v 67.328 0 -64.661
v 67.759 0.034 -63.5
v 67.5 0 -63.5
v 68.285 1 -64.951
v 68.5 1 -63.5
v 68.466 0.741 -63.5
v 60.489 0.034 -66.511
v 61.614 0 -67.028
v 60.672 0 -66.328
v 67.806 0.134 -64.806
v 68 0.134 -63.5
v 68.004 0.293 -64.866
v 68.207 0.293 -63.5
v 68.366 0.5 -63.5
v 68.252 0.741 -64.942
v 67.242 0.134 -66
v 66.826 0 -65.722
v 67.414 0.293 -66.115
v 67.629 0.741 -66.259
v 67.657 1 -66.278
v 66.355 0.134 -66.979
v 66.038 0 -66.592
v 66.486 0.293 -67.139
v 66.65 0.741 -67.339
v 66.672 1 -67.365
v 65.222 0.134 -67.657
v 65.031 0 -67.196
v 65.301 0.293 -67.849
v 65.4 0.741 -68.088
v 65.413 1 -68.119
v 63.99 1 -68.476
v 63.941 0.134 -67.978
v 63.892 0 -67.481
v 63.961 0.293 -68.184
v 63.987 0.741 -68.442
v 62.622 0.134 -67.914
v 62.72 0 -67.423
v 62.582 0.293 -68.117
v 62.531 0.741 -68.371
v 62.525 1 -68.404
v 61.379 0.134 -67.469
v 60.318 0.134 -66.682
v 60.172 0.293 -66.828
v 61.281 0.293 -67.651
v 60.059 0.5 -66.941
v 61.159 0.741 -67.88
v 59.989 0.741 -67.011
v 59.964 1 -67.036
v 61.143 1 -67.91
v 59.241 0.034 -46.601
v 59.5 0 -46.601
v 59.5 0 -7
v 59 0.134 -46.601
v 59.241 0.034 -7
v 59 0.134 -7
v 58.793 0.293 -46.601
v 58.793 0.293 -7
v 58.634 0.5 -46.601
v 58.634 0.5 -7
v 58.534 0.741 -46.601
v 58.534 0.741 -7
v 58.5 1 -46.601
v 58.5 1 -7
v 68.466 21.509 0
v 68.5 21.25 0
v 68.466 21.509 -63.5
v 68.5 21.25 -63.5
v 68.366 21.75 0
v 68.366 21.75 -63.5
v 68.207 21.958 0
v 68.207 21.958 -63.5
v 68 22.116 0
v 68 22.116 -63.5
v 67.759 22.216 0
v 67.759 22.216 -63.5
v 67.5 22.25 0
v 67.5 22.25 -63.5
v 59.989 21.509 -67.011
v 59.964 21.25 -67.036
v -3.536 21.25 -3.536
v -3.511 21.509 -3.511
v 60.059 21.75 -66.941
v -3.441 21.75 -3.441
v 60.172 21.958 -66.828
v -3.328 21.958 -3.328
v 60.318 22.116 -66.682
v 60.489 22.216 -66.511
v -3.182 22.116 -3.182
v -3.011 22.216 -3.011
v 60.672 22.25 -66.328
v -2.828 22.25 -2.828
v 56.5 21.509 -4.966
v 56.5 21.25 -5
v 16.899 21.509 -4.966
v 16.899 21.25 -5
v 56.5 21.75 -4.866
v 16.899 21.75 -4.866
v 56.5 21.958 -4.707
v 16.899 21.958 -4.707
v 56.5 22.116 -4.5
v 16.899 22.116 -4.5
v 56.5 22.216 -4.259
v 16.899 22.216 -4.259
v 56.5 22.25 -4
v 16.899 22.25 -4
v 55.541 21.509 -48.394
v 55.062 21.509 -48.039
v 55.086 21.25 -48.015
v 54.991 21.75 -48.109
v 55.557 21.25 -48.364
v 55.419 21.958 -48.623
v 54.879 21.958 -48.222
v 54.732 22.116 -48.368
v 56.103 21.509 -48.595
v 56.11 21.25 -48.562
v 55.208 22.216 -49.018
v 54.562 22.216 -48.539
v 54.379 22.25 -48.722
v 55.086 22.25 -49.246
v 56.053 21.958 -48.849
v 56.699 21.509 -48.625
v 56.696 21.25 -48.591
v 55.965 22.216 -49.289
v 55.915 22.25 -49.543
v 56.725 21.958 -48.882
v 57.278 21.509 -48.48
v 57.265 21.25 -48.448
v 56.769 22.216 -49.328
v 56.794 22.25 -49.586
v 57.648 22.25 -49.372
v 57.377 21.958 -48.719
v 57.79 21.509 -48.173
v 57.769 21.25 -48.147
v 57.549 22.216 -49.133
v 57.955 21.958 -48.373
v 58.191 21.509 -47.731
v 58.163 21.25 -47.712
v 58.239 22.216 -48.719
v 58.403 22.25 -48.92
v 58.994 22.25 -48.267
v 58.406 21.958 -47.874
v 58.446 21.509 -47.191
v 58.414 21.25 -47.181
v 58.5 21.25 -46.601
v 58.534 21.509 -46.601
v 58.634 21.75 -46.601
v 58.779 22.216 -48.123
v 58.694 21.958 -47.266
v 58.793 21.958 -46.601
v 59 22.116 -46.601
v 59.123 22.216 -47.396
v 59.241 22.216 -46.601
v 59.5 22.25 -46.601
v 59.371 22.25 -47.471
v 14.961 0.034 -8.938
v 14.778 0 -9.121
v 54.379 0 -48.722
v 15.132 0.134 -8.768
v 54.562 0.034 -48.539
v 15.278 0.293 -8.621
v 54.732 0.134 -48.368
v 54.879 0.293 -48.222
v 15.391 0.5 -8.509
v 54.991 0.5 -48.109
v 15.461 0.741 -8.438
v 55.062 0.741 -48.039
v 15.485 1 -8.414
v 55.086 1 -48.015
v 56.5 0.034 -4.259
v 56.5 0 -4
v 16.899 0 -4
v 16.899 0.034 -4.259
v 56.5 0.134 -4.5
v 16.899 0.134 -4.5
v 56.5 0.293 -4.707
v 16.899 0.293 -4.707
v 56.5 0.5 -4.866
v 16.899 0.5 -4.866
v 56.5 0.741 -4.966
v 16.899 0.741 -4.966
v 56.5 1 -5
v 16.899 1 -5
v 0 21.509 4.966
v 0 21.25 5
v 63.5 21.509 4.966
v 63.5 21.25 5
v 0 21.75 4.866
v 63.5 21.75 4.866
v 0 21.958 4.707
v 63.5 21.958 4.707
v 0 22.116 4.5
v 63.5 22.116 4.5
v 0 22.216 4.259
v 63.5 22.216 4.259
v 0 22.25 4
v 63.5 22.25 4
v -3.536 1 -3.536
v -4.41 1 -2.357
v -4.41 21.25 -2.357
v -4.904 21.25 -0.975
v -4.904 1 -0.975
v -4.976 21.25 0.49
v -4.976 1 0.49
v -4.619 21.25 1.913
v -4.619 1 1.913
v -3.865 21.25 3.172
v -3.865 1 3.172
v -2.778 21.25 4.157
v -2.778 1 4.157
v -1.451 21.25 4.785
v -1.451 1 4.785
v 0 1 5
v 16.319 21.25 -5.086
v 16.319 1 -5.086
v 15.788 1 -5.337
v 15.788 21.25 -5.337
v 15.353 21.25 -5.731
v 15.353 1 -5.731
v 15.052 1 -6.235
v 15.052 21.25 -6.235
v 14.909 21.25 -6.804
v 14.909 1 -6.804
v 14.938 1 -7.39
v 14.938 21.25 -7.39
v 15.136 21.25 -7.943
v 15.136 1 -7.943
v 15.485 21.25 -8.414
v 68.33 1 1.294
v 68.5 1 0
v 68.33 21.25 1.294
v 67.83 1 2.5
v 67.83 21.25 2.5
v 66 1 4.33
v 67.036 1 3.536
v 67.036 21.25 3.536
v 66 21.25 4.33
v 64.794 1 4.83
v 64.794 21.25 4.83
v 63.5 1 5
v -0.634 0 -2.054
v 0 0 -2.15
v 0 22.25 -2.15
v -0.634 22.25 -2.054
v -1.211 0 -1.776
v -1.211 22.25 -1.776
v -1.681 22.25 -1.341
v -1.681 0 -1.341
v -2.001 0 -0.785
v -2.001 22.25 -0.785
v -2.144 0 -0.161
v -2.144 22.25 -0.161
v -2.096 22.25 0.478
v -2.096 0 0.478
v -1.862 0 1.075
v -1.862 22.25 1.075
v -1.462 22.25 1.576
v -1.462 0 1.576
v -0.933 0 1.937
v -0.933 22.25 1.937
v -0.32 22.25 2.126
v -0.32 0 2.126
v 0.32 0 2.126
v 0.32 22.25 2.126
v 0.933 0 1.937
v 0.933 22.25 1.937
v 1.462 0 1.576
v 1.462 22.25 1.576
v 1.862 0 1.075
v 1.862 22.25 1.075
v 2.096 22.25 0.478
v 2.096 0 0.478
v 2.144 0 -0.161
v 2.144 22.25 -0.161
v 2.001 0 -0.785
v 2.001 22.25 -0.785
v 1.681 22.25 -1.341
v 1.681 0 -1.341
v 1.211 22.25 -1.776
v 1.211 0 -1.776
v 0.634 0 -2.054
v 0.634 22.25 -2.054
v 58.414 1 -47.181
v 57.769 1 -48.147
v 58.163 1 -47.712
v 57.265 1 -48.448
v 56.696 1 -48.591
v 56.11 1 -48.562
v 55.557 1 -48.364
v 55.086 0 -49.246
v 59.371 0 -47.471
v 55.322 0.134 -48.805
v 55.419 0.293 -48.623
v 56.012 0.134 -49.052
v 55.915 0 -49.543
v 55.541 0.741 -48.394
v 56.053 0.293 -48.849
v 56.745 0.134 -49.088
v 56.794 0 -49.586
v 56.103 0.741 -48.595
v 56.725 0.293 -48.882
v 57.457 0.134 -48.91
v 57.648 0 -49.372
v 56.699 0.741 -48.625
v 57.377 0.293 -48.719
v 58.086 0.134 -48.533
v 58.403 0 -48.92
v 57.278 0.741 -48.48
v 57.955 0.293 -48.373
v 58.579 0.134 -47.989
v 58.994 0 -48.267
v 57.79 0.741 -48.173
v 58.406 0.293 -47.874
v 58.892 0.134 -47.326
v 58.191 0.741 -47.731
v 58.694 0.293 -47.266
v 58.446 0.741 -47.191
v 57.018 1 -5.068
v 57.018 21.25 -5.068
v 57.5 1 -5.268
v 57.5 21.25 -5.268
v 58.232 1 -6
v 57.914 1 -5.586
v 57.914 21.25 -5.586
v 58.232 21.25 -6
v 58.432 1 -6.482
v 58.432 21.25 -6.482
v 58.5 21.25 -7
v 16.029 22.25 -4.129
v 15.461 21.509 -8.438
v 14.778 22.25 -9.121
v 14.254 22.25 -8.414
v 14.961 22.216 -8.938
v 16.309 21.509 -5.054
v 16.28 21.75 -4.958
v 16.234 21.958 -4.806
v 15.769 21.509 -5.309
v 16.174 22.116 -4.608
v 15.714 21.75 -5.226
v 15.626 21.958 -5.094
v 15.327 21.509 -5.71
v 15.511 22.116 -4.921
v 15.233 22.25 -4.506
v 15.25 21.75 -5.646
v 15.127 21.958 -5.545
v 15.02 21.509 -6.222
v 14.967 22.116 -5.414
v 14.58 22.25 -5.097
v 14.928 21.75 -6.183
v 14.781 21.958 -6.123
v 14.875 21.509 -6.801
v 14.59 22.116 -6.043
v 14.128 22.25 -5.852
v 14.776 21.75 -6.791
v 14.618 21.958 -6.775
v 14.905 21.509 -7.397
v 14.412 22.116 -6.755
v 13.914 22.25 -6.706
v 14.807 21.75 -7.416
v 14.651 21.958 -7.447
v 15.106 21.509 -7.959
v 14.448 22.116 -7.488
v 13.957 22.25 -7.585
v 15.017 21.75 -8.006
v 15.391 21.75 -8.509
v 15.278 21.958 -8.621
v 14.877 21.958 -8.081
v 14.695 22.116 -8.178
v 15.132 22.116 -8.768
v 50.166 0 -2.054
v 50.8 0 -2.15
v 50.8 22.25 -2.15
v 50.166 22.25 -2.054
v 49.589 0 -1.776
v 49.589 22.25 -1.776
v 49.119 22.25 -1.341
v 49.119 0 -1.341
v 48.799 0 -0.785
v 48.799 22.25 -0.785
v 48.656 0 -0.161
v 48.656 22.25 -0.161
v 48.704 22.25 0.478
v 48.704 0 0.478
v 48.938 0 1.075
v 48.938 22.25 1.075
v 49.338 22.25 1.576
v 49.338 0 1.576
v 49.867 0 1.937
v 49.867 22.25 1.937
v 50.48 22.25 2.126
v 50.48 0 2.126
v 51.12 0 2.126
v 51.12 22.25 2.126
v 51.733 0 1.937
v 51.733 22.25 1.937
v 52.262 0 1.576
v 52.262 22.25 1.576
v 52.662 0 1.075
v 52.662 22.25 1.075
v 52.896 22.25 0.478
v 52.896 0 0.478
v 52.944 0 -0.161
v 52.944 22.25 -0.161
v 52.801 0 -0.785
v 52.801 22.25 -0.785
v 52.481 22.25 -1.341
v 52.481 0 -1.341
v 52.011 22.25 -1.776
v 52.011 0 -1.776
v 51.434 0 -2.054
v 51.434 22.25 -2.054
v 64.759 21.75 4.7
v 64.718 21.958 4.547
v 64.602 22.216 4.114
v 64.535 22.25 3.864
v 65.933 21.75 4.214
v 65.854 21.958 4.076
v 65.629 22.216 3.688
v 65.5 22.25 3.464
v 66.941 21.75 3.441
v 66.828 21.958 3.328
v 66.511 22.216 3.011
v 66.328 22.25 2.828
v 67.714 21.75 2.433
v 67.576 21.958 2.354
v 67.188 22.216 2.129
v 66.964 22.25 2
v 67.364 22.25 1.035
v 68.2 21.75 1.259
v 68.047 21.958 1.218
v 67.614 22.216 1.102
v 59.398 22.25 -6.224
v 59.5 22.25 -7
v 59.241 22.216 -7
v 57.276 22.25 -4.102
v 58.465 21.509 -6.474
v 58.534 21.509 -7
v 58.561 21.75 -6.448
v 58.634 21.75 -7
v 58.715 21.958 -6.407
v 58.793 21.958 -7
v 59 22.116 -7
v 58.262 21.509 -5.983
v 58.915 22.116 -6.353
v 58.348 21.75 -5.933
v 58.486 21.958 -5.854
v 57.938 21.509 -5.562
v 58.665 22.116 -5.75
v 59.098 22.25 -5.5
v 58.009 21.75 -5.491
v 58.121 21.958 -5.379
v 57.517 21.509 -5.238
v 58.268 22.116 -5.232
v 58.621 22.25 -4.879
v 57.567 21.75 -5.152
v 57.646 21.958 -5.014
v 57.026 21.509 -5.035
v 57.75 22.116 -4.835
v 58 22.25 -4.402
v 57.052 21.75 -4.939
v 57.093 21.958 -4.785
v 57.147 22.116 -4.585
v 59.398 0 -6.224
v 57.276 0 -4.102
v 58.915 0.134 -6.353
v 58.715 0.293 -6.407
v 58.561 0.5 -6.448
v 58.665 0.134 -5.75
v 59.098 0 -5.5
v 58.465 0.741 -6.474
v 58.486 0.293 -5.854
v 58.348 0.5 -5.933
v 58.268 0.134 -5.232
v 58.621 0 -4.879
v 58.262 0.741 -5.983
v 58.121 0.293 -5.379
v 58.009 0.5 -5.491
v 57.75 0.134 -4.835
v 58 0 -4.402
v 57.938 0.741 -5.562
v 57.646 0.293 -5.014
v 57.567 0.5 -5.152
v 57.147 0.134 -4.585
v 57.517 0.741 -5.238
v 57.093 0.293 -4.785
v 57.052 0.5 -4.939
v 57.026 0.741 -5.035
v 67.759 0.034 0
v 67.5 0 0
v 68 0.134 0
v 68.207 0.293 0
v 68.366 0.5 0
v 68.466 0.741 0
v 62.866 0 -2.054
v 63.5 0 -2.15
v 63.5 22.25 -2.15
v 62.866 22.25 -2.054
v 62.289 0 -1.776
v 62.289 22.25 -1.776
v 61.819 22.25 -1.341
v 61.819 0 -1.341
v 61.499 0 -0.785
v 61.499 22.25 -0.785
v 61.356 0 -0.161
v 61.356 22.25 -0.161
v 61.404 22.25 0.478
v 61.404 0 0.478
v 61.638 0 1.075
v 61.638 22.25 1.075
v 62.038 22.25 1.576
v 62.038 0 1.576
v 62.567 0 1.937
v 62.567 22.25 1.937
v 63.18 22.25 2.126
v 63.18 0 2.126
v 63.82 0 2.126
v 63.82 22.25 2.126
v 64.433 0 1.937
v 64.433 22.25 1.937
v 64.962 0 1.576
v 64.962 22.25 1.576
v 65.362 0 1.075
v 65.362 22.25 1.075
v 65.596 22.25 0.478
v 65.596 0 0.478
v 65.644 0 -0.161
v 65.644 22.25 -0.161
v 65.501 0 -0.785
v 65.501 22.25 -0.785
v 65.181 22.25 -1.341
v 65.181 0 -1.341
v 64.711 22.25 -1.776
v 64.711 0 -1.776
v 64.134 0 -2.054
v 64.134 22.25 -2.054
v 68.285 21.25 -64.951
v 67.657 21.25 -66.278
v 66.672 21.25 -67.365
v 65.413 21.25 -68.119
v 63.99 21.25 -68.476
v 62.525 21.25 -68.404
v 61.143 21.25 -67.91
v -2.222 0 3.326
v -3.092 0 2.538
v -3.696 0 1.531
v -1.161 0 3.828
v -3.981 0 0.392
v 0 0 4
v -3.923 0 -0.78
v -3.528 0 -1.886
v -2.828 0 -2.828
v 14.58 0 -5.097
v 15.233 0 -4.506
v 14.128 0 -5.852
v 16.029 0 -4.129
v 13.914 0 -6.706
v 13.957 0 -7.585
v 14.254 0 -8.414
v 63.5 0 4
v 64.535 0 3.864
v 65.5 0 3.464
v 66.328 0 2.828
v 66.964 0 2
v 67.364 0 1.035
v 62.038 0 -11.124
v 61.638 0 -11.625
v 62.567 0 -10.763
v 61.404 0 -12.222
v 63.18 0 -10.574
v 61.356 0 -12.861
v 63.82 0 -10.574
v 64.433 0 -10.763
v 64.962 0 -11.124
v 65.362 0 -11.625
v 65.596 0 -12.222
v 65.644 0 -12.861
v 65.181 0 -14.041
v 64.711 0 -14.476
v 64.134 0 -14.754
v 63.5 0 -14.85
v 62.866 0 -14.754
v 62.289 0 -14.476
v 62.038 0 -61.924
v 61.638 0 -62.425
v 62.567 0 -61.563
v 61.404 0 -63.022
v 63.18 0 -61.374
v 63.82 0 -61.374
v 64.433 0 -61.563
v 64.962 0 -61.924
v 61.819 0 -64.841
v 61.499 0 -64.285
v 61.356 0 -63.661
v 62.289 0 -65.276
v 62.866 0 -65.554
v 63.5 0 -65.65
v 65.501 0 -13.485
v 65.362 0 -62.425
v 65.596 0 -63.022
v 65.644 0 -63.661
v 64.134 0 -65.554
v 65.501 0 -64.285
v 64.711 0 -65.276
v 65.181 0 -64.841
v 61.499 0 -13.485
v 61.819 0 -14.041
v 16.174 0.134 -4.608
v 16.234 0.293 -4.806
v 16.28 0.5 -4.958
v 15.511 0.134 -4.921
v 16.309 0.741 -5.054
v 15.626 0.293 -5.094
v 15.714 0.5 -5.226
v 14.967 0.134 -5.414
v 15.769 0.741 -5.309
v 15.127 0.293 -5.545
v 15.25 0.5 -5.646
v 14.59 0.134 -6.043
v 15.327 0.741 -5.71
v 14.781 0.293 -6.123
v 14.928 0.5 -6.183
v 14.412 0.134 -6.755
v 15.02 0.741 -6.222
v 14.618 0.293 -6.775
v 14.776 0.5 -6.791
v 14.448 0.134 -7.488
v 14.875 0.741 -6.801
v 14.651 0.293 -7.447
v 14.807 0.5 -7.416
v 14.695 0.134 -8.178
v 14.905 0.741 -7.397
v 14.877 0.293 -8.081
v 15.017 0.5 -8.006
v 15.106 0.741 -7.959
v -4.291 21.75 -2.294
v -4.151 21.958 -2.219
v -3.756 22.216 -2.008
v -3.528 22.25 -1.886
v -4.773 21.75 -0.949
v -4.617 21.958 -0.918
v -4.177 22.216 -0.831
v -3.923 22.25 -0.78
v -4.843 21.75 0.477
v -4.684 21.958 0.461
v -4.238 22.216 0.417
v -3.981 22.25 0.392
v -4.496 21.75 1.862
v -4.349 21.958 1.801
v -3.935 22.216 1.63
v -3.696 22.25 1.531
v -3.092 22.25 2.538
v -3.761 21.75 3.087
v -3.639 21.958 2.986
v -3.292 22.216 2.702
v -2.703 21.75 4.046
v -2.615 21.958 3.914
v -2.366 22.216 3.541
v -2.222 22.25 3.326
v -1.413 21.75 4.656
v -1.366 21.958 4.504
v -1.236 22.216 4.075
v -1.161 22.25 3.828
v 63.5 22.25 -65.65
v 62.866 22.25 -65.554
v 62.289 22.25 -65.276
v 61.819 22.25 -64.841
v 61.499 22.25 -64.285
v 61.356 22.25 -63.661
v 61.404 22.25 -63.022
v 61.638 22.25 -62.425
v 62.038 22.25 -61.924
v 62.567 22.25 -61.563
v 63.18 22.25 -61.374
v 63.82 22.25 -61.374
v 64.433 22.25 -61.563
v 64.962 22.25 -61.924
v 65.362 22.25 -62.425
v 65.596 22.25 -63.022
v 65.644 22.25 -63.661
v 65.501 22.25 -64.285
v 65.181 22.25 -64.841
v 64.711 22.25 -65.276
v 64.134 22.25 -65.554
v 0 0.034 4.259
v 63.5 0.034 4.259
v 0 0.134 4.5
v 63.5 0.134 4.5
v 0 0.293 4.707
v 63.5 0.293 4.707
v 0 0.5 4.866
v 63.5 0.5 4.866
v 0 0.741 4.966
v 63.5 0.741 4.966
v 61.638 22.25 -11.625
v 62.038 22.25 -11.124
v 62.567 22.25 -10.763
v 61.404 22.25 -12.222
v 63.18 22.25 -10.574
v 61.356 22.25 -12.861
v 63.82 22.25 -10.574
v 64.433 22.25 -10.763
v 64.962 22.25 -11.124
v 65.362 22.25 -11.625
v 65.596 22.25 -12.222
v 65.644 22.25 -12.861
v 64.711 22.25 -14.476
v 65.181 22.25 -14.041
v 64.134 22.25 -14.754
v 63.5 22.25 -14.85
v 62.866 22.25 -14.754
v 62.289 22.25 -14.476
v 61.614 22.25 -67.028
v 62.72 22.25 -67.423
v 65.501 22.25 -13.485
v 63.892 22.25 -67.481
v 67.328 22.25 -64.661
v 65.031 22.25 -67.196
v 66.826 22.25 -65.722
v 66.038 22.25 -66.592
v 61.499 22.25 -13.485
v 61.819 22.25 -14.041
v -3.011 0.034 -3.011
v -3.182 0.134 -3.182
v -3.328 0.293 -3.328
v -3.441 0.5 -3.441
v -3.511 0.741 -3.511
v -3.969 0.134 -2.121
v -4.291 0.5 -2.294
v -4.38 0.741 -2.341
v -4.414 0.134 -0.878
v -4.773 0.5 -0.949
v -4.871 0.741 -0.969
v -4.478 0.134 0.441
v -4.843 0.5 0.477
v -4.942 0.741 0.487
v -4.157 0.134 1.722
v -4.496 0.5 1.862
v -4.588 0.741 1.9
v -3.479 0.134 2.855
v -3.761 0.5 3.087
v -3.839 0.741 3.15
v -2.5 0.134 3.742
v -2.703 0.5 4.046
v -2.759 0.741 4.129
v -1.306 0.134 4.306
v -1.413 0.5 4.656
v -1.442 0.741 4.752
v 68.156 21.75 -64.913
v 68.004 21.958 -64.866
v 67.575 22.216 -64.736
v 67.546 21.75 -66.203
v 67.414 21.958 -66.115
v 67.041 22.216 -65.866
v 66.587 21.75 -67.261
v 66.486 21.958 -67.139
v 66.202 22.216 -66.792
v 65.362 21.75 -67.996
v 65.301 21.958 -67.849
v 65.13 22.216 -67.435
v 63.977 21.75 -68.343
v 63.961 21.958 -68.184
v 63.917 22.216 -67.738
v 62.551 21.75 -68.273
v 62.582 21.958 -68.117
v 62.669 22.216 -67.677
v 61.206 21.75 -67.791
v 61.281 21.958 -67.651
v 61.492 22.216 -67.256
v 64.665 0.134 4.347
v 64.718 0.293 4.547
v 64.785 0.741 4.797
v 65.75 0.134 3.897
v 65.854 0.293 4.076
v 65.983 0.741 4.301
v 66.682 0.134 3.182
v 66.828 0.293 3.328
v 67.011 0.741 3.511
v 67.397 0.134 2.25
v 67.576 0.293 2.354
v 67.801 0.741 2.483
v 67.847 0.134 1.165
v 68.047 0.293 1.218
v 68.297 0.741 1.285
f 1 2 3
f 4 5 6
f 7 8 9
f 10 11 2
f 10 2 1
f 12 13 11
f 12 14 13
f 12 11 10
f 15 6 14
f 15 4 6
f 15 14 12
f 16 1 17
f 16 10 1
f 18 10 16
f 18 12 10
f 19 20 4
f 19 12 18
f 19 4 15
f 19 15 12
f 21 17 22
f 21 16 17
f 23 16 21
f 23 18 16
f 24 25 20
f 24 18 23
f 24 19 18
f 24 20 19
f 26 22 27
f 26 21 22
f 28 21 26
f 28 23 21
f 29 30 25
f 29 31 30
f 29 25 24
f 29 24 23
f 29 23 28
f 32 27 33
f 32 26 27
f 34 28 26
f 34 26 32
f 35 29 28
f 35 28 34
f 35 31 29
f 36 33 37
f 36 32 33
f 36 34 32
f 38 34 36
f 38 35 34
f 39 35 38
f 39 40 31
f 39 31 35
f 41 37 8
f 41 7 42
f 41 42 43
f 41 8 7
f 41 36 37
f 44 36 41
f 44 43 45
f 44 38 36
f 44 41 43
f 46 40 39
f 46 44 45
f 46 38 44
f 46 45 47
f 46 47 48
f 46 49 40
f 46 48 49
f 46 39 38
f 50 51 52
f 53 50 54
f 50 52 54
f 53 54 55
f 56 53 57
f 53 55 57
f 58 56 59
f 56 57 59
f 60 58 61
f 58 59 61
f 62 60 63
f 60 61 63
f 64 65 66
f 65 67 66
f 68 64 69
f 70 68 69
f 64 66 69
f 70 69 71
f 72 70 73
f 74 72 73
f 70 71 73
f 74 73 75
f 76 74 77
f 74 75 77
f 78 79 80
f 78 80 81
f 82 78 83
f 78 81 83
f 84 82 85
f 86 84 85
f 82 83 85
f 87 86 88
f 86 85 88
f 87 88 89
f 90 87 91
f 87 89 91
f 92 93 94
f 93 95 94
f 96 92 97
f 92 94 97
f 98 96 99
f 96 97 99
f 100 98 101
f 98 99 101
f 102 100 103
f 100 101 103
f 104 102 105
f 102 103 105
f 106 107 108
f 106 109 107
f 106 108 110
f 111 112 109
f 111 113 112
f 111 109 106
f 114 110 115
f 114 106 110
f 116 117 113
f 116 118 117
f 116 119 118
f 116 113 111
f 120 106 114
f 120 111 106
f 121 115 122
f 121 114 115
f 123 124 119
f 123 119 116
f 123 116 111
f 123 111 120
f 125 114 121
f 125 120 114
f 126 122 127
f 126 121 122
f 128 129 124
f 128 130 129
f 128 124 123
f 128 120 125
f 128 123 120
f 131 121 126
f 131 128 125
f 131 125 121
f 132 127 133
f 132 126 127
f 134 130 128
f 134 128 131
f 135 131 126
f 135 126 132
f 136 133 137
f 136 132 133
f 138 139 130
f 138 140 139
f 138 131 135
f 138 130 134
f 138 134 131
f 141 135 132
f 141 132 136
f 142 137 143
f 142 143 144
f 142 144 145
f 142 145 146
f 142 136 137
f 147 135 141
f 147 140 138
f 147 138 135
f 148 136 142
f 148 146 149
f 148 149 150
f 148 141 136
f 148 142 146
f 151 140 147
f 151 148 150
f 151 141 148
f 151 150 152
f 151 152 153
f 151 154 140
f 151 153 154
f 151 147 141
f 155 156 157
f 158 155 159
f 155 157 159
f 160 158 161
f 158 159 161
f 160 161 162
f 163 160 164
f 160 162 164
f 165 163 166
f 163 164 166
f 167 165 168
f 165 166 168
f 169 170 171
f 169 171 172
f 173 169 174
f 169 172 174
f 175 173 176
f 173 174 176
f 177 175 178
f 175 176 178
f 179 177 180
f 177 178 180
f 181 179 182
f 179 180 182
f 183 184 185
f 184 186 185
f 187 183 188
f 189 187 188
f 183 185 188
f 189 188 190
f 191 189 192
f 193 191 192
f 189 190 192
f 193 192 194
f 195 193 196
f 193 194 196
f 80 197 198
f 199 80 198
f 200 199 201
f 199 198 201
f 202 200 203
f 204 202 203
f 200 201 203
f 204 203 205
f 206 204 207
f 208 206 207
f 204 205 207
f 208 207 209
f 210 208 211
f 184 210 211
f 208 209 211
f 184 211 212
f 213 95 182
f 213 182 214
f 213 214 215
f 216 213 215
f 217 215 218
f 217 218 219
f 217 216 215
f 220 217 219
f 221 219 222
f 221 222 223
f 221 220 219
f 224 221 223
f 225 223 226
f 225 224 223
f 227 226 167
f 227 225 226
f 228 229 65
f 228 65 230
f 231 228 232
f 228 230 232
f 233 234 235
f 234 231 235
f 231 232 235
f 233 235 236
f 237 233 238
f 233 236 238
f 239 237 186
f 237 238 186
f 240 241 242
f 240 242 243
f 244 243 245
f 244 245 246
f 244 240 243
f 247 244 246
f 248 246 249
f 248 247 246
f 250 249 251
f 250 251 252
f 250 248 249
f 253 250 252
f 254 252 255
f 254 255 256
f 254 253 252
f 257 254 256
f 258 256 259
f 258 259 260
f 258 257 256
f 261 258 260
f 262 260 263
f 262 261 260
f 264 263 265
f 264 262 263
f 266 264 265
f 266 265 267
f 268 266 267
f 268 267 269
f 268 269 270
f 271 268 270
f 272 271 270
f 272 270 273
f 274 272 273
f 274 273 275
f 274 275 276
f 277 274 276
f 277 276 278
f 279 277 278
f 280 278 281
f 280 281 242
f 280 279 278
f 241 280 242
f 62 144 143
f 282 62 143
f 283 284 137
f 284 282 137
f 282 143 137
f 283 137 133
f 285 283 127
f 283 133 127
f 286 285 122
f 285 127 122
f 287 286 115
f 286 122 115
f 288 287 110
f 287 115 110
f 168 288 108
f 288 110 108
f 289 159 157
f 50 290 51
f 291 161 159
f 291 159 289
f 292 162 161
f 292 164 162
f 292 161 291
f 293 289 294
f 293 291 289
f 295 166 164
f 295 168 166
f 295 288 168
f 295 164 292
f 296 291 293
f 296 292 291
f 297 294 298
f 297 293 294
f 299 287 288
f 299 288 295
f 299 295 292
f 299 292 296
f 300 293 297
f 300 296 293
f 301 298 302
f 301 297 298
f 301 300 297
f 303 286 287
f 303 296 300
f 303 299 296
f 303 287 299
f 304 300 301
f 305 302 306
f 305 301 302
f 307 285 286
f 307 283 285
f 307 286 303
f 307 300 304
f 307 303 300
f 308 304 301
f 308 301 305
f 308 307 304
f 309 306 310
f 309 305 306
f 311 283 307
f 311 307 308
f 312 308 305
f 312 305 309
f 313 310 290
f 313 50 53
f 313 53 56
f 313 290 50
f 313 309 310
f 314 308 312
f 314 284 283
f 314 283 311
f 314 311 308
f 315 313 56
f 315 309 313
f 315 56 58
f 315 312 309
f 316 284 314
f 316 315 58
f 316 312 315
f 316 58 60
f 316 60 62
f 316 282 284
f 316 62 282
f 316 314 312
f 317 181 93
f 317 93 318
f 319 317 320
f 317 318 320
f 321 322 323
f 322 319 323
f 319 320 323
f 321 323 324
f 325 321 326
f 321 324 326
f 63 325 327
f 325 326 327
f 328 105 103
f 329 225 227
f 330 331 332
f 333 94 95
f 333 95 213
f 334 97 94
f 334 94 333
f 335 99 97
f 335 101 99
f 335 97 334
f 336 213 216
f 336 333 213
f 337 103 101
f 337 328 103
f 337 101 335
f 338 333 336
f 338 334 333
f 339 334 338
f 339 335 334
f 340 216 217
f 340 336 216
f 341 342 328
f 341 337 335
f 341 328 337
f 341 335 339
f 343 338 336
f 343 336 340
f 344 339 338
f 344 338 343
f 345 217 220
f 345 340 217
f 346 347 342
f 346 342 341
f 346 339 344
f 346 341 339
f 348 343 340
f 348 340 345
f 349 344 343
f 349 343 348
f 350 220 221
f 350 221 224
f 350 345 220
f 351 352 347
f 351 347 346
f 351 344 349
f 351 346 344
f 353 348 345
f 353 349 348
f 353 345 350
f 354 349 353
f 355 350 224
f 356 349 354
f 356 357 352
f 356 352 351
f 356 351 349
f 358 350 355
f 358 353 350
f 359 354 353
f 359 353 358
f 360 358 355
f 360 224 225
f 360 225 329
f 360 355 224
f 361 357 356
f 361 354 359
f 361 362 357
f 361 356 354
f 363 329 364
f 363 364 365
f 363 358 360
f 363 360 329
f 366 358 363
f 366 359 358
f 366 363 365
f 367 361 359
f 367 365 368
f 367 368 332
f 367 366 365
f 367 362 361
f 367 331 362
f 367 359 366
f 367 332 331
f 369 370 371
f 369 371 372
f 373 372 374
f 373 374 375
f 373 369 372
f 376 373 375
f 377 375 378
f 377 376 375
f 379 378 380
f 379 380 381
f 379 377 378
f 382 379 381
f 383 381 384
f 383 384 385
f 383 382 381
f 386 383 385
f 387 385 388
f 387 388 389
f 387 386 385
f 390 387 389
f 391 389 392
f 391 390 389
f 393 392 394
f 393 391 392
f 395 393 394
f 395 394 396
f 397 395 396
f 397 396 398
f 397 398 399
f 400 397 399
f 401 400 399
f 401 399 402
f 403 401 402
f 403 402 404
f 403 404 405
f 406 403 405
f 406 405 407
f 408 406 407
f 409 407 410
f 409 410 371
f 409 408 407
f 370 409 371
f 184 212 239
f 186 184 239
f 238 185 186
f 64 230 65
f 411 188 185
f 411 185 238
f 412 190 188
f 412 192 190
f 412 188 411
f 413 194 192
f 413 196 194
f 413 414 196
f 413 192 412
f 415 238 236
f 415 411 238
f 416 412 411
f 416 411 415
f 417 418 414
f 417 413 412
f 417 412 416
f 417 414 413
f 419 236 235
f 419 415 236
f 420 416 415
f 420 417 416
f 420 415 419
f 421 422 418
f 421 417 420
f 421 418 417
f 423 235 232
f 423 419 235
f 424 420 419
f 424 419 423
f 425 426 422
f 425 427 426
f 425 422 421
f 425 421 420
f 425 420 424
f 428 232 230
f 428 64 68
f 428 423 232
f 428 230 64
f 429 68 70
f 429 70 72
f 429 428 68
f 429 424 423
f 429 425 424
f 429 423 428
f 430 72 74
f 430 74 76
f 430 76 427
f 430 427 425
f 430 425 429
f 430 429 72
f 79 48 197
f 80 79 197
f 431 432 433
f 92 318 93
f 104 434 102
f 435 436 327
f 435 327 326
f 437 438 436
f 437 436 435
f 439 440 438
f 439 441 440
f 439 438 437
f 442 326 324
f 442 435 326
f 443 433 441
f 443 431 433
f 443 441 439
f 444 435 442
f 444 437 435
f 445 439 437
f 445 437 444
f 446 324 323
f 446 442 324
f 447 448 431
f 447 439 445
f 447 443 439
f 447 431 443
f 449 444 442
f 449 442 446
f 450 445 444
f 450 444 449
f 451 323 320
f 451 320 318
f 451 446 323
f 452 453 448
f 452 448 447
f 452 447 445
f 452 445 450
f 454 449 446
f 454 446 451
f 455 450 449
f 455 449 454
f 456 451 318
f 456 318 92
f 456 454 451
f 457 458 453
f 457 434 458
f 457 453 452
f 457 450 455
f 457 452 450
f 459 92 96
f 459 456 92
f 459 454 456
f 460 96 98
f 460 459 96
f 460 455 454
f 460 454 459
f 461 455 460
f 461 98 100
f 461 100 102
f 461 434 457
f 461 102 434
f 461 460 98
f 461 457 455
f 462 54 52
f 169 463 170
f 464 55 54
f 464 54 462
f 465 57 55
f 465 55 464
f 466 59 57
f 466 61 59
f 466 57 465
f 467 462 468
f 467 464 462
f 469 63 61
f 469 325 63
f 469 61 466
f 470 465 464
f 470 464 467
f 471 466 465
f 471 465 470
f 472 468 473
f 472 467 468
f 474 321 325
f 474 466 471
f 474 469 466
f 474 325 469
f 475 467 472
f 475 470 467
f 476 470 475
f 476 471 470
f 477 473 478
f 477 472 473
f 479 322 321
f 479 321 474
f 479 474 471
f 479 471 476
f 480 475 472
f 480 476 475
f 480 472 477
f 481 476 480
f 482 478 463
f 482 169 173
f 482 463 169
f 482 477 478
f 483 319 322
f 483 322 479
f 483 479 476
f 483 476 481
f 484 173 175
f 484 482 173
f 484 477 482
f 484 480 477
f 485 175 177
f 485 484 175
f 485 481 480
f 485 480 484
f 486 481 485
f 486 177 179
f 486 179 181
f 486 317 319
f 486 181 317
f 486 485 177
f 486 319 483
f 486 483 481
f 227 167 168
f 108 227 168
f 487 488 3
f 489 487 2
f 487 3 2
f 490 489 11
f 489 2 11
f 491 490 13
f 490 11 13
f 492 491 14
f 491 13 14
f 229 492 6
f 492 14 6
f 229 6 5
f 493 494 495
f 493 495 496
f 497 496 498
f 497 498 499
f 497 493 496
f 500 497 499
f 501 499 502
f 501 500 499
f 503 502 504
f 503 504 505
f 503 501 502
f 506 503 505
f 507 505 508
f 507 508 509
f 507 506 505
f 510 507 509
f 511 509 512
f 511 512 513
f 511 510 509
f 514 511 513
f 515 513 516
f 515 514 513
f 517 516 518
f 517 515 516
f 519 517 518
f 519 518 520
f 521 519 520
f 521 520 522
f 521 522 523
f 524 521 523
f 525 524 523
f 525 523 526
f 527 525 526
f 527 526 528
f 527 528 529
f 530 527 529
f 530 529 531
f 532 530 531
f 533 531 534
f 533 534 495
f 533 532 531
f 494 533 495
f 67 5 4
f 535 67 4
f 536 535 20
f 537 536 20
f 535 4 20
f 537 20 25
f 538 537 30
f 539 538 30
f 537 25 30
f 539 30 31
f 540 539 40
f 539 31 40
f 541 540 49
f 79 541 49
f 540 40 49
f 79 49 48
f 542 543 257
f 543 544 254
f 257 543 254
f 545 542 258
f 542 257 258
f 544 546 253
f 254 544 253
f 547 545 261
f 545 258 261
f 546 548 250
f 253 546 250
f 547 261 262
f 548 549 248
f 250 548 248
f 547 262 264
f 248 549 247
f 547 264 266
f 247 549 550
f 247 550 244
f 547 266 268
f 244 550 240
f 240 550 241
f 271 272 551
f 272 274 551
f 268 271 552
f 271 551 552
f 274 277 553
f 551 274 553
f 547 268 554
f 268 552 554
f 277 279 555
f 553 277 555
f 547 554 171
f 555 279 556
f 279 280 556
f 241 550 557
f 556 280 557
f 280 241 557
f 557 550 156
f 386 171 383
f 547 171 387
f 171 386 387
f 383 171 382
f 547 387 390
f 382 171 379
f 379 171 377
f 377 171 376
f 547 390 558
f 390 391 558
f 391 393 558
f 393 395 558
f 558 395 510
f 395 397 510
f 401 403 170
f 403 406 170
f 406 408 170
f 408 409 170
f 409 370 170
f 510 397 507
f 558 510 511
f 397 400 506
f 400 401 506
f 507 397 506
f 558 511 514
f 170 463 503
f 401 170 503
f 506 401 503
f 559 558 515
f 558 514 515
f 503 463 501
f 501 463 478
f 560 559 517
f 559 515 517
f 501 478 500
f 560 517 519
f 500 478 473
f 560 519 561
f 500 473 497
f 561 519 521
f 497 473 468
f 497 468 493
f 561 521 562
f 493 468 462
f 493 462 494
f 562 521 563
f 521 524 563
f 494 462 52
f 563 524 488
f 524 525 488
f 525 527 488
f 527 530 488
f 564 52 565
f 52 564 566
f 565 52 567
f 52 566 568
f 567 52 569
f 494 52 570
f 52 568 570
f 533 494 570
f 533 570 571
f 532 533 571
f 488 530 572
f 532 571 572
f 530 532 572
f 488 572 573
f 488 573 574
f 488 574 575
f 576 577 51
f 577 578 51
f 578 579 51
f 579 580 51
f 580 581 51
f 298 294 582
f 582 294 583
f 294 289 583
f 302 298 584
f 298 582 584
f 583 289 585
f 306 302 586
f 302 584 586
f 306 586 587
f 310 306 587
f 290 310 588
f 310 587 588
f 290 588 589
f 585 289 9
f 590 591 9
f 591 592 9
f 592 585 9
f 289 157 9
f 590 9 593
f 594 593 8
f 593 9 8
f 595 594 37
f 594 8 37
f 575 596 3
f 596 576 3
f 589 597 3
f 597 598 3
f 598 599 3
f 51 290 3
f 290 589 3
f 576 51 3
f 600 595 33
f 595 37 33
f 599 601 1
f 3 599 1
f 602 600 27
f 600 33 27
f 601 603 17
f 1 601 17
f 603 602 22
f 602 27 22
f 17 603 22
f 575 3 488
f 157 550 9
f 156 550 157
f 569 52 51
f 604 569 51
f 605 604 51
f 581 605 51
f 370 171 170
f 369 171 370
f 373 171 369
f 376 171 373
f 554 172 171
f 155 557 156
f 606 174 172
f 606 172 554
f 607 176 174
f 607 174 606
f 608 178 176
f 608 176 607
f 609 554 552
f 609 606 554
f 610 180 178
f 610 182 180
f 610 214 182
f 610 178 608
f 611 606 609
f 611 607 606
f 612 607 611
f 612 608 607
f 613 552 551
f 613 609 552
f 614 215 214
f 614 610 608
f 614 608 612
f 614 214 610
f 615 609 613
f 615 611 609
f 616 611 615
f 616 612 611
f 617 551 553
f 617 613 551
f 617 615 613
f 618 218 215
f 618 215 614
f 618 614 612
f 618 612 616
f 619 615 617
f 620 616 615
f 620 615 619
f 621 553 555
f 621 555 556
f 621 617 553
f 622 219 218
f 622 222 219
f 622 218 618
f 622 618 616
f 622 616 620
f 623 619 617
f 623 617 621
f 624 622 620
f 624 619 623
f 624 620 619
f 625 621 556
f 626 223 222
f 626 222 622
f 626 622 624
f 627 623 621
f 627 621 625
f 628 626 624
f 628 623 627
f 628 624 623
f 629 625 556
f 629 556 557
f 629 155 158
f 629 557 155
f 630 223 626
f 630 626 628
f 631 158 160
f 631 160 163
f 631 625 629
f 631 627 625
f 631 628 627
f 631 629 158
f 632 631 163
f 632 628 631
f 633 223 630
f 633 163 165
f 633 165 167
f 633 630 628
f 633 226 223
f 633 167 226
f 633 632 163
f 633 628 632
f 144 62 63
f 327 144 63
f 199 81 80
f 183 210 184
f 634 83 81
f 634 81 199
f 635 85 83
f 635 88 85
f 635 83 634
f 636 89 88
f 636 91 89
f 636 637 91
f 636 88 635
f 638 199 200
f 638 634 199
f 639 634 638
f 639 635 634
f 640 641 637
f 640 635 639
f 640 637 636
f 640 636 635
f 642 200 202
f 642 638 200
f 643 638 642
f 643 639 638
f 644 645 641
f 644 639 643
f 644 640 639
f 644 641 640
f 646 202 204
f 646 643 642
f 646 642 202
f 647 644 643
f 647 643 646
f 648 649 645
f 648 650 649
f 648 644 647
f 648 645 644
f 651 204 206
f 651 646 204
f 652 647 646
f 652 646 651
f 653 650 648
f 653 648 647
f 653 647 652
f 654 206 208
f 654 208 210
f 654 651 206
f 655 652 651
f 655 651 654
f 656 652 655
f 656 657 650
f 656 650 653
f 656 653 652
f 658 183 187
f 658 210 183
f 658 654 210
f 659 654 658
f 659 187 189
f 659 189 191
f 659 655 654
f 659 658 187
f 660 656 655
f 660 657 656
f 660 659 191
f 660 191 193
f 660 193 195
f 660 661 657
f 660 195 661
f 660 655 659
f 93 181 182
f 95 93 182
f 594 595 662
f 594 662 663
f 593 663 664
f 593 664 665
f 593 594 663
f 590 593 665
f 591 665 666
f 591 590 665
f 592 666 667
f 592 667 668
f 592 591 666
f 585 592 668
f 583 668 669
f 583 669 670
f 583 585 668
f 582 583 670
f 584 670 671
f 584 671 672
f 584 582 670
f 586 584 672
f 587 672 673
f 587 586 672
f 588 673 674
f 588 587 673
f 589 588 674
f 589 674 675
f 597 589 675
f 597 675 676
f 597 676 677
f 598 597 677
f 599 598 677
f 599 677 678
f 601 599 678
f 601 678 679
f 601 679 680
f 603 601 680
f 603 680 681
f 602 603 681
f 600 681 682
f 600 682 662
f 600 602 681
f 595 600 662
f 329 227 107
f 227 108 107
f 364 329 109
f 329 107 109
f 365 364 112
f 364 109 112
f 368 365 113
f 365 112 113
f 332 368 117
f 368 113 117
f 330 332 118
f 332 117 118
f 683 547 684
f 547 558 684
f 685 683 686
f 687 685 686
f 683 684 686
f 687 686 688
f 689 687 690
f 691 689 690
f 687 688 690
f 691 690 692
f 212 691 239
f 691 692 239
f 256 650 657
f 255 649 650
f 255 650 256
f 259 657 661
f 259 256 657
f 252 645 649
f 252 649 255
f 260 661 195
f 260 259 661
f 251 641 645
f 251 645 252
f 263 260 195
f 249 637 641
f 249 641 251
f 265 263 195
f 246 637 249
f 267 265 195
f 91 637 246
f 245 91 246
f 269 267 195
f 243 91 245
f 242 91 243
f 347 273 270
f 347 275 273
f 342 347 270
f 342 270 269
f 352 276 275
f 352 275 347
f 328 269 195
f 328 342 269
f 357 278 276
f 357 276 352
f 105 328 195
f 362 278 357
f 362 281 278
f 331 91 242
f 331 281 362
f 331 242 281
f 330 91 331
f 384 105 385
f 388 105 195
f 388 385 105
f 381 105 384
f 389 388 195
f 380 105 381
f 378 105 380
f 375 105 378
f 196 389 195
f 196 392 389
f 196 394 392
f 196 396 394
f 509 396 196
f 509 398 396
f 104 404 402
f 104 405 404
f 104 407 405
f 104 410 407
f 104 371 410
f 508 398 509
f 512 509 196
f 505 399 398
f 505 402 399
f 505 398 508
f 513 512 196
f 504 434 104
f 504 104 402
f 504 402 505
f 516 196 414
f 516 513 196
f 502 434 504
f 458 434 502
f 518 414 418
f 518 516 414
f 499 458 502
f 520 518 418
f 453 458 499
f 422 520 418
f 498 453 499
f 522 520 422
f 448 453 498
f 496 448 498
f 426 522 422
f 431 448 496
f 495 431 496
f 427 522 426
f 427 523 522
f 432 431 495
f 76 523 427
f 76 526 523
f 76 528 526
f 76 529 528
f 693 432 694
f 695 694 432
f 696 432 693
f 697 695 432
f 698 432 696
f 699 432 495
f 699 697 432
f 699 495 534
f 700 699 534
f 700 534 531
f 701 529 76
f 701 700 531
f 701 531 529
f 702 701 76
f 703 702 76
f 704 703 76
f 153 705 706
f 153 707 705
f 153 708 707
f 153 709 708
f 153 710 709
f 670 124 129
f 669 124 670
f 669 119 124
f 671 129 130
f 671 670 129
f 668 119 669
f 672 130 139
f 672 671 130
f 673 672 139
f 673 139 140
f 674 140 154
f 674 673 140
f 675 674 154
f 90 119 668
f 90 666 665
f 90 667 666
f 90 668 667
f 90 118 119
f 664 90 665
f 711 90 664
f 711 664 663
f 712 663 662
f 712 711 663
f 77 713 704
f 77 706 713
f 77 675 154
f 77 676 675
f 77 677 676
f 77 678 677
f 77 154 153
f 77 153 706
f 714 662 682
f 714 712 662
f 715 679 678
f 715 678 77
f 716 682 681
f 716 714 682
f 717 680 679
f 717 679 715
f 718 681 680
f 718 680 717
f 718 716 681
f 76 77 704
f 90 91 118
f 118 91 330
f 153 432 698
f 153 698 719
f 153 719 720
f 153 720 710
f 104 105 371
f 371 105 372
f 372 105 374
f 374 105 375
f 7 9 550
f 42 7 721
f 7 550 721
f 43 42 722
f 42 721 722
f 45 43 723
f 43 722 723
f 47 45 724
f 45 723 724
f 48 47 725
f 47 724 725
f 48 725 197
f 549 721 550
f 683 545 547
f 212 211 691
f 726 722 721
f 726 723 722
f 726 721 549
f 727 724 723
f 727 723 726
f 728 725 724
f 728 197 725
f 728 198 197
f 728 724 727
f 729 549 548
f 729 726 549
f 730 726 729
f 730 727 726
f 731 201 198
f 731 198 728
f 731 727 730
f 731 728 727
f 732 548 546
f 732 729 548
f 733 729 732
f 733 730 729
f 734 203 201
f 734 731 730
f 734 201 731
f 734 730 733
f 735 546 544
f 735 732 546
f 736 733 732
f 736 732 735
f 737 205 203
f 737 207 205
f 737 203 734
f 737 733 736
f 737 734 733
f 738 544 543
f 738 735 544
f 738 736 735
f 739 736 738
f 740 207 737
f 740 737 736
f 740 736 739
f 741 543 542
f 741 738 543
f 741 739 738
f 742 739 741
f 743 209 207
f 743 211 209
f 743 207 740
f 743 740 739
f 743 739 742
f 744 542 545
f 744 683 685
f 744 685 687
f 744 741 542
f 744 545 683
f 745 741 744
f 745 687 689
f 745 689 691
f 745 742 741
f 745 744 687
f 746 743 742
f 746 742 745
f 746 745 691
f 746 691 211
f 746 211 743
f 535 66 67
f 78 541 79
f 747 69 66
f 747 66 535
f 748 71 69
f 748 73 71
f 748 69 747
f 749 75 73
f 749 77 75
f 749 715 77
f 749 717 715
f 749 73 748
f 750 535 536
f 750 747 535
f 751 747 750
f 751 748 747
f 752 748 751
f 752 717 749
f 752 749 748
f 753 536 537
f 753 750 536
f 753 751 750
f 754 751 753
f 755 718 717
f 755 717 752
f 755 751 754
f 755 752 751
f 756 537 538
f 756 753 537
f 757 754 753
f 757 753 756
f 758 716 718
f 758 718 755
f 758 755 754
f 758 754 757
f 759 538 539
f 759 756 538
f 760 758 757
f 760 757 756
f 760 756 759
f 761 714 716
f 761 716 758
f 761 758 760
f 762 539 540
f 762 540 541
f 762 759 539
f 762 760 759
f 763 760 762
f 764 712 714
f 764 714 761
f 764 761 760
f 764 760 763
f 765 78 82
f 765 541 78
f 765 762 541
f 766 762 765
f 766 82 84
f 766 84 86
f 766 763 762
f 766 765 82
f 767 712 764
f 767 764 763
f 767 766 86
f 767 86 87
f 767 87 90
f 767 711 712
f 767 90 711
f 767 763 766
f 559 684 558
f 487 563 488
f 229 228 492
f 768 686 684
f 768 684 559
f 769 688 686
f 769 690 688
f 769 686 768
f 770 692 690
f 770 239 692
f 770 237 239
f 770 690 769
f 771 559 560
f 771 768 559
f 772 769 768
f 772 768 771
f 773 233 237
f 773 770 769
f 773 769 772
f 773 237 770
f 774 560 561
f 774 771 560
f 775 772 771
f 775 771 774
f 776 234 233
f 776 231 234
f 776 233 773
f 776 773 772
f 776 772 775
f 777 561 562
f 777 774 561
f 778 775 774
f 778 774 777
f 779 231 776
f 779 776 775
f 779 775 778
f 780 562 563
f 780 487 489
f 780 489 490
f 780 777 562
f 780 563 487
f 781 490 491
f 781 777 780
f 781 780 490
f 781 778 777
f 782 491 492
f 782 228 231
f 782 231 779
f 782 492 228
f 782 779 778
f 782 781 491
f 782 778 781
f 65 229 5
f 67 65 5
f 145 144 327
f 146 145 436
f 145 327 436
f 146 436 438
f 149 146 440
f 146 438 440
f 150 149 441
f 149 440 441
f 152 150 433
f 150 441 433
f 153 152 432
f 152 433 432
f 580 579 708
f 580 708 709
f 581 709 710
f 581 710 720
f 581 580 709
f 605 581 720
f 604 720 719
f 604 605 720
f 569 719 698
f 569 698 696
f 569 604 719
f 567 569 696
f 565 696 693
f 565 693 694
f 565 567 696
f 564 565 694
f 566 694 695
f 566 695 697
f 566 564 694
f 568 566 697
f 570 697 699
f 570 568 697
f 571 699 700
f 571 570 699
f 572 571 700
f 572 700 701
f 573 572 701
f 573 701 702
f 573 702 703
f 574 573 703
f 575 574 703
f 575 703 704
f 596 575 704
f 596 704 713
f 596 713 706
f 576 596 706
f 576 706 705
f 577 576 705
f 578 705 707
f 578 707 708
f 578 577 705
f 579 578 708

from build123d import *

# Parameters (mm, degrees)
SKETCH1_R           = 2.15
BOSS_EXTRUDE1_DEPTH = 22.2504
FILLET1_R           = 5
FILLET2_R           = 2
FILLET3_R           = 1


with BuildPart() as part:
    # Sketch1 → Boss-Extrude1 (new body)
    with BuildSketch(Plane(origin=(0, 0, 0), x_dir=(1, 0, 0), z_dir=(0, 1, 0))):
        with BuildLine():
            Line((59.964466094, 67.035533906), (-3.535533906, 3.535533906))
            ThreePointArc((-3.535533906, 3.535533906), (-4.619397663, -1.913417162), (0, -5))
            Line((0, -5), (68.5, -5))
            Line((68.5, -5), (68.5, 63.5))
            ThreePointArc((68.5, 63.5), (65.413417162, 68.119397663), (59.964466094, 67.035533906))
        make_face()
        Polygon((12.071067812, 5), (58.5, 51.428932188), (58.5, 5), align=None, mode=Mode.SUBTRACT)
        with Locations(Location((0, 0, 0), (0, 0, 90))):
            Circle(SKETCH1_R, mode=Mode.SUBTRACT)
        with Locations(Location((63.5, 63.5, 0), (0, 0, 90))):
            Circle(SKETCH1_R, mode=Mode.SUBTRACT)
        with Locations(Location((50.8, 0, 0), (0, 0, 90))):
            Circle(SKETCH1_R, mode=Mode.SUBTRACT)
        with Locations(Location((63.5, 0, 0), (0, 0, 90))):
            Circle(SKETCH1_R, mode=Mode.SUBTRACT)
        with Locations(Location((63.5, 12.7, 0), (0, 0, 90))):
            Circle(SKETCH1_R, mode=Mode.SUBTRACT)
    extrude(amount=BOSS_EXTRUDE1_DEPTH)

    # Fillet1
    fillet1_edges = [part.edges().sort_by_distance(p)[0] for p in [
        (68.5, 11.1252, 5),
    ]]
    fillet(fillet1_edges, radius=FILLET1_R)

    # Fillet2
    fillet2_edges = [part.edges().sort_by_distance(p)[0] for p in [
        (58.5, 11.1252, -5),
        (58.5, 11.1252, -51.428932188),
        (12.071067812, 11.1252, -5),
    ]]
    fillet(fillet2_edges, radius=FILLET2_R)

    # Fillet3
    fillet3_edges = [part.edges().sort_by_distance(p)[0] for p in [
        (68.5, 22.2504, -31.75),
        (65.413417162, 22.2504, -68.119397663),
        (31.75, 0, 5),
        (-4.619397663, 0, 1.913417162),
        (28.214466094, 22.2504, -35.285533906),
        (28.214466094, 0, -35.285533906),
        (65.413417162, 0, -68.119397663),
        (68.5, 0, -31.75),
        (-4.619397663, 22.2504, 1.913417162),
        (31.75, 22.2504, 5),
        (67.035533906, 0, 3.535533906),
        (67.035533906, 22.2504, 3.535533906),
        (58.5, 0, -26.800252532),
        (58.5, 22.2504, -26.800252532),
        (35.285533906, 0, -28.214466094),
        (35.285533906, 22.2504, -28.214466094),
        (36.699747468, 0, -5),
        (36.699747468, 22.2504, -5),
        (57.265366865, 0, -48.448264128),
        (57.265366865, 22.2504, -48.448264128),
        (57.914213562, 0, -5.585786438),
        (57.914213562, 22.2504, -5.585786438),
        (15.051735872, 0, -6.234633135),
        (15.051735872, 22.2504, -6.234633135),
    ]]
    fillet(fillet3_edges, radius=FILLET3_R)


solid = part.part
